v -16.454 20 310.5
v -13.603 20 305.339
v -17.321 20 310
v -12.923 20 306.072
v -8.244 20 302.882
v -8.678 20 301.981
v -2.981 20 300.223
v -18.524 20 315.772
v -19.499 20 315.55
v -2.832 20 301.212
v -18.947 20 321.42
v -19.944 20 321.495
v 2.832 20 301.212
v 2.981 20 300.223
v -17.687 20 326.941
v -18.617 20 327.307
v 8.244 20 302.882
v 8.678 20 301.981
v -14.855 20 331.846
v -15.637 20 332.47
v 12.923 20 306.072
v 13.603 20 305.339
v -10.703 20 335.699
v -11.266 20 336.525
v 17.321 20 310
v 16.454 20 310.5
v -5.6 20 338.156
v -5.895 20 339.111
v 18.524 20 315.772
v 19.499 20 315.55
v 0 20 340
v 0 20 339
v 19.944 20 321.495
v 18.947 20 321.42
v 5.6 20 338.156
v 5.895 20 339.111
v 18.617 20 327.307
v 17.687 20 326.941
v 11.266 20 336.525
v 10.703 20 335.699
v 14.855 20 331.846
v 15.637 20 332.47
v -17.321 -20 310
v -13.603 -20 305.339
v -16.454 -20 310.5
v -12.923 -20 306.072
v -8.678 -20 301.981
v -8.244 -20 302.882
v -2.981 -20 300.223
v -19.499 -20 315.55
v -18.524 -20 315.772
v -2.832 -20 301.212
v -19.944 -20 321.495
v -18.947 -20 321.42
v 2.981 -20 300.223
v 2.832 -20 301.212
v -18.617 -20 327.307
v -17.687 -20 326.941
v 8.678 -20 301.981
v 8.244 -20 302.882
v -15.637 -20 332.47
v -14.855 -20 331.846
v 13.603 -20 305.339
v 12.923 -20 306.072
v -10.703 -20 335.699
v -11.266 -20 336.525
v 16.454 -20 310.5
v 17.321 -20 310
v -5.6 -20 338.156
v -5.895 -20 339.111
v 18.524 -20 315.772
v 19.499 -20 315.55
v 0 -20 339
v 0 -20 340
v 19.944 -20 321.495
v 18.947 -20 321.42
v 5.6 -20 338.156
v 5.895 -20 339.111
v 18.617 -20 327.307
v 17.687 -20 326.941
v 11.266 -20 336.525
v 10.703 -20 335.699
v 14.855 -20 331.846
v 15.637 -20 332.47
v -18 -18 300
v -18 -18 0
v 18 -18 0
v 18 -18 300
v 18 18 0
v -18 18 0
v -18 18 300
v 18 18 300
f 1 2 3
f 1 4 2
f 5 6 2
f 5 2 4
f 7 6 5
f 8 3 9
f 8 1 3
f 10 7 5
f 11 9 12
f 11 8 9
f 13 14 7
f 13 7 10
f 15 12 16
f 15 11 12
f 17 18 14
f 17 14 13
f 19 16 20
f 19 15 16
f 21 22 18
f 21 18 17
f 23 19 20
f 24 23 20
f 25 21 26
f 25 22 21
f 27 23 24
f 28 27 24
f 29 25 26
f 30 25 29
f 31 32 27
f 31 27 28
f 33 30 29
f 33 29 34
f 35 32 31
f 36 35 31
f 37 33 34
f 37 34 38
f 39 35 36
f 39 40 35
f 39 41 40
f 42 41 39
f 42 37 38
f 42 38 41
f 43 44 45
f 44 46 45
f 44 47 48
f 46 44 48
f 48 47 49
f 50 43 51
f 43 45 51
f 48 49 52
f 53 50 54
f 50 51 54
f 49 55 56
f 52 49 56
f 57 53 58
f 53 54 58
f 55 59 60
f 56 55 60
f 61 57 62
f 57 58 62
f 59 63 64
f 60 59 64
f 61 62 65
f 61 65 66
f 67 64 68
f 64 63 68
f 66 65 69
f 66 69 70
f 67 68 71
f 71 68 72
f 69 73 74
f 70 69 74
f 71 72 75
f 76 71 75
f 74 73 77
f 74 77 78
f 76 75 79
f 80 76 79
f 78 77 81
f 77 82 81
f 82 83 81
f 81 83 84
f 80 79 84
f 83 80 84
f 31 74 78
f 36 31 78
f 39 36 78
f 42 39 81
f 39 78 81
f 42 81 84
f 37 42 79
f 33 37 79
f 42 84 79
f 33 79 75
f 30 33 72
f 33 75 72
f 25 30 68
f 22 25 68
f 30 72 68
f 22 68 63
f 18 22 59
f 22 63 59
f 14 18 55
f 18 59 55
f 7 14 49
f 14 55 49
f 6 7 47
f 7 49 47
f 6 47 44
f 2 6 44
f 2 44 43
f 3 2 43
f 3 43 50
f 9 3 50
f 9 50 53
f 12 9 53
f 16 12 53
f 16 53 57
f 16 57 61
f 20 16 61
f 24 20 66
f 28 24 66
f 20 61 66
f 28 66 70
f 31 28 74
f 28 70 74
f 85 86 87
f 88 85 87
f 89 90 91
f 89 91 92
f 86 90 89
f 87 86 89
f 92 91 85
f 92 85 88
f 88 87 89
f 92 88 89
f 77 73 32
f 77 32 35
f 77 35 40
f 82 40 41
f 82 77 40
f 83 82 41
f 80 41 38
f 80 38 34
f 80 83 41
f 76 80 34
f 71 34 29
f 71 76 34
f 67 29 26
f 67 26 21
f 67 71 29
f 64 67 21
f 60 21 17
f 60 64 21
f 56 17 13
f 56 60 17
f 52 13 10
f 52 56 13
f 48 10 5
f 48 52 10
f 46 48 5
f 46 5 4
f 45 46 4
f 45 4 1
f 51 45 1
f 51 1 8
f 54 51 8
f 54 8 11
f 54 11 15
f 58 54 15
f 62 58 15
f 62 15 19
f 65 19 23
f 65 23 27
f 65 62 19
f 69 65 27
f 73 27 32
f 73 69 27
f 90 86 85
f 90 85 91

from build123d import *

# Parameters (mm, degrees)
SKETCH1_W                = 36
SKETCH1_H                = 36
BOSS_EXTRUDE1_DEPTH      = 300
BOSS_EXTRUDE2_DEPTH      = 20
BOSS_EXTRUDE2_DEPTH_BACK = 20
SKETCH2_R                = 20
SKETCH2_R_2              = 19


with BuildPart() as part:
    # Sketch1 → Boss-Extrude1 (new body)
    with BuildSketch(Plane.XY):
        Rectangle(SKETCH1_W, SKETCH1_H)
    extrude(amount=BOSS_EXTRUDE1_DEPTH)


with BuildPart() as body_2:
    # Sketch2 → Boss-Extrude2 (new, two sides: drawn at the far end of the back side and taken through both)
    with BuildSketch(Plane(origin=(0, 0, 0), x_dir=(1, 0, 0), z_dir=(0, 1, 0)).offset(-BOSS_EXTRUDE2_DEPTH_BACK)):
        with Locations(Location((0, -320, 0), (0, 0, 270))):
            Circle(SKETCH2_R)
        with Locations(Location((0, -320, 0), (0, 0, 270))):
            Circle(SKETCH2_R_2, mode=Mode.SUBTRACT)
    extrude(amount=BOSS_EXTRUDE2_DEPTH + BOSS_EXTRUDE2_DEPTH_BACK)


solid = Compound([part.part, body_2.part])
